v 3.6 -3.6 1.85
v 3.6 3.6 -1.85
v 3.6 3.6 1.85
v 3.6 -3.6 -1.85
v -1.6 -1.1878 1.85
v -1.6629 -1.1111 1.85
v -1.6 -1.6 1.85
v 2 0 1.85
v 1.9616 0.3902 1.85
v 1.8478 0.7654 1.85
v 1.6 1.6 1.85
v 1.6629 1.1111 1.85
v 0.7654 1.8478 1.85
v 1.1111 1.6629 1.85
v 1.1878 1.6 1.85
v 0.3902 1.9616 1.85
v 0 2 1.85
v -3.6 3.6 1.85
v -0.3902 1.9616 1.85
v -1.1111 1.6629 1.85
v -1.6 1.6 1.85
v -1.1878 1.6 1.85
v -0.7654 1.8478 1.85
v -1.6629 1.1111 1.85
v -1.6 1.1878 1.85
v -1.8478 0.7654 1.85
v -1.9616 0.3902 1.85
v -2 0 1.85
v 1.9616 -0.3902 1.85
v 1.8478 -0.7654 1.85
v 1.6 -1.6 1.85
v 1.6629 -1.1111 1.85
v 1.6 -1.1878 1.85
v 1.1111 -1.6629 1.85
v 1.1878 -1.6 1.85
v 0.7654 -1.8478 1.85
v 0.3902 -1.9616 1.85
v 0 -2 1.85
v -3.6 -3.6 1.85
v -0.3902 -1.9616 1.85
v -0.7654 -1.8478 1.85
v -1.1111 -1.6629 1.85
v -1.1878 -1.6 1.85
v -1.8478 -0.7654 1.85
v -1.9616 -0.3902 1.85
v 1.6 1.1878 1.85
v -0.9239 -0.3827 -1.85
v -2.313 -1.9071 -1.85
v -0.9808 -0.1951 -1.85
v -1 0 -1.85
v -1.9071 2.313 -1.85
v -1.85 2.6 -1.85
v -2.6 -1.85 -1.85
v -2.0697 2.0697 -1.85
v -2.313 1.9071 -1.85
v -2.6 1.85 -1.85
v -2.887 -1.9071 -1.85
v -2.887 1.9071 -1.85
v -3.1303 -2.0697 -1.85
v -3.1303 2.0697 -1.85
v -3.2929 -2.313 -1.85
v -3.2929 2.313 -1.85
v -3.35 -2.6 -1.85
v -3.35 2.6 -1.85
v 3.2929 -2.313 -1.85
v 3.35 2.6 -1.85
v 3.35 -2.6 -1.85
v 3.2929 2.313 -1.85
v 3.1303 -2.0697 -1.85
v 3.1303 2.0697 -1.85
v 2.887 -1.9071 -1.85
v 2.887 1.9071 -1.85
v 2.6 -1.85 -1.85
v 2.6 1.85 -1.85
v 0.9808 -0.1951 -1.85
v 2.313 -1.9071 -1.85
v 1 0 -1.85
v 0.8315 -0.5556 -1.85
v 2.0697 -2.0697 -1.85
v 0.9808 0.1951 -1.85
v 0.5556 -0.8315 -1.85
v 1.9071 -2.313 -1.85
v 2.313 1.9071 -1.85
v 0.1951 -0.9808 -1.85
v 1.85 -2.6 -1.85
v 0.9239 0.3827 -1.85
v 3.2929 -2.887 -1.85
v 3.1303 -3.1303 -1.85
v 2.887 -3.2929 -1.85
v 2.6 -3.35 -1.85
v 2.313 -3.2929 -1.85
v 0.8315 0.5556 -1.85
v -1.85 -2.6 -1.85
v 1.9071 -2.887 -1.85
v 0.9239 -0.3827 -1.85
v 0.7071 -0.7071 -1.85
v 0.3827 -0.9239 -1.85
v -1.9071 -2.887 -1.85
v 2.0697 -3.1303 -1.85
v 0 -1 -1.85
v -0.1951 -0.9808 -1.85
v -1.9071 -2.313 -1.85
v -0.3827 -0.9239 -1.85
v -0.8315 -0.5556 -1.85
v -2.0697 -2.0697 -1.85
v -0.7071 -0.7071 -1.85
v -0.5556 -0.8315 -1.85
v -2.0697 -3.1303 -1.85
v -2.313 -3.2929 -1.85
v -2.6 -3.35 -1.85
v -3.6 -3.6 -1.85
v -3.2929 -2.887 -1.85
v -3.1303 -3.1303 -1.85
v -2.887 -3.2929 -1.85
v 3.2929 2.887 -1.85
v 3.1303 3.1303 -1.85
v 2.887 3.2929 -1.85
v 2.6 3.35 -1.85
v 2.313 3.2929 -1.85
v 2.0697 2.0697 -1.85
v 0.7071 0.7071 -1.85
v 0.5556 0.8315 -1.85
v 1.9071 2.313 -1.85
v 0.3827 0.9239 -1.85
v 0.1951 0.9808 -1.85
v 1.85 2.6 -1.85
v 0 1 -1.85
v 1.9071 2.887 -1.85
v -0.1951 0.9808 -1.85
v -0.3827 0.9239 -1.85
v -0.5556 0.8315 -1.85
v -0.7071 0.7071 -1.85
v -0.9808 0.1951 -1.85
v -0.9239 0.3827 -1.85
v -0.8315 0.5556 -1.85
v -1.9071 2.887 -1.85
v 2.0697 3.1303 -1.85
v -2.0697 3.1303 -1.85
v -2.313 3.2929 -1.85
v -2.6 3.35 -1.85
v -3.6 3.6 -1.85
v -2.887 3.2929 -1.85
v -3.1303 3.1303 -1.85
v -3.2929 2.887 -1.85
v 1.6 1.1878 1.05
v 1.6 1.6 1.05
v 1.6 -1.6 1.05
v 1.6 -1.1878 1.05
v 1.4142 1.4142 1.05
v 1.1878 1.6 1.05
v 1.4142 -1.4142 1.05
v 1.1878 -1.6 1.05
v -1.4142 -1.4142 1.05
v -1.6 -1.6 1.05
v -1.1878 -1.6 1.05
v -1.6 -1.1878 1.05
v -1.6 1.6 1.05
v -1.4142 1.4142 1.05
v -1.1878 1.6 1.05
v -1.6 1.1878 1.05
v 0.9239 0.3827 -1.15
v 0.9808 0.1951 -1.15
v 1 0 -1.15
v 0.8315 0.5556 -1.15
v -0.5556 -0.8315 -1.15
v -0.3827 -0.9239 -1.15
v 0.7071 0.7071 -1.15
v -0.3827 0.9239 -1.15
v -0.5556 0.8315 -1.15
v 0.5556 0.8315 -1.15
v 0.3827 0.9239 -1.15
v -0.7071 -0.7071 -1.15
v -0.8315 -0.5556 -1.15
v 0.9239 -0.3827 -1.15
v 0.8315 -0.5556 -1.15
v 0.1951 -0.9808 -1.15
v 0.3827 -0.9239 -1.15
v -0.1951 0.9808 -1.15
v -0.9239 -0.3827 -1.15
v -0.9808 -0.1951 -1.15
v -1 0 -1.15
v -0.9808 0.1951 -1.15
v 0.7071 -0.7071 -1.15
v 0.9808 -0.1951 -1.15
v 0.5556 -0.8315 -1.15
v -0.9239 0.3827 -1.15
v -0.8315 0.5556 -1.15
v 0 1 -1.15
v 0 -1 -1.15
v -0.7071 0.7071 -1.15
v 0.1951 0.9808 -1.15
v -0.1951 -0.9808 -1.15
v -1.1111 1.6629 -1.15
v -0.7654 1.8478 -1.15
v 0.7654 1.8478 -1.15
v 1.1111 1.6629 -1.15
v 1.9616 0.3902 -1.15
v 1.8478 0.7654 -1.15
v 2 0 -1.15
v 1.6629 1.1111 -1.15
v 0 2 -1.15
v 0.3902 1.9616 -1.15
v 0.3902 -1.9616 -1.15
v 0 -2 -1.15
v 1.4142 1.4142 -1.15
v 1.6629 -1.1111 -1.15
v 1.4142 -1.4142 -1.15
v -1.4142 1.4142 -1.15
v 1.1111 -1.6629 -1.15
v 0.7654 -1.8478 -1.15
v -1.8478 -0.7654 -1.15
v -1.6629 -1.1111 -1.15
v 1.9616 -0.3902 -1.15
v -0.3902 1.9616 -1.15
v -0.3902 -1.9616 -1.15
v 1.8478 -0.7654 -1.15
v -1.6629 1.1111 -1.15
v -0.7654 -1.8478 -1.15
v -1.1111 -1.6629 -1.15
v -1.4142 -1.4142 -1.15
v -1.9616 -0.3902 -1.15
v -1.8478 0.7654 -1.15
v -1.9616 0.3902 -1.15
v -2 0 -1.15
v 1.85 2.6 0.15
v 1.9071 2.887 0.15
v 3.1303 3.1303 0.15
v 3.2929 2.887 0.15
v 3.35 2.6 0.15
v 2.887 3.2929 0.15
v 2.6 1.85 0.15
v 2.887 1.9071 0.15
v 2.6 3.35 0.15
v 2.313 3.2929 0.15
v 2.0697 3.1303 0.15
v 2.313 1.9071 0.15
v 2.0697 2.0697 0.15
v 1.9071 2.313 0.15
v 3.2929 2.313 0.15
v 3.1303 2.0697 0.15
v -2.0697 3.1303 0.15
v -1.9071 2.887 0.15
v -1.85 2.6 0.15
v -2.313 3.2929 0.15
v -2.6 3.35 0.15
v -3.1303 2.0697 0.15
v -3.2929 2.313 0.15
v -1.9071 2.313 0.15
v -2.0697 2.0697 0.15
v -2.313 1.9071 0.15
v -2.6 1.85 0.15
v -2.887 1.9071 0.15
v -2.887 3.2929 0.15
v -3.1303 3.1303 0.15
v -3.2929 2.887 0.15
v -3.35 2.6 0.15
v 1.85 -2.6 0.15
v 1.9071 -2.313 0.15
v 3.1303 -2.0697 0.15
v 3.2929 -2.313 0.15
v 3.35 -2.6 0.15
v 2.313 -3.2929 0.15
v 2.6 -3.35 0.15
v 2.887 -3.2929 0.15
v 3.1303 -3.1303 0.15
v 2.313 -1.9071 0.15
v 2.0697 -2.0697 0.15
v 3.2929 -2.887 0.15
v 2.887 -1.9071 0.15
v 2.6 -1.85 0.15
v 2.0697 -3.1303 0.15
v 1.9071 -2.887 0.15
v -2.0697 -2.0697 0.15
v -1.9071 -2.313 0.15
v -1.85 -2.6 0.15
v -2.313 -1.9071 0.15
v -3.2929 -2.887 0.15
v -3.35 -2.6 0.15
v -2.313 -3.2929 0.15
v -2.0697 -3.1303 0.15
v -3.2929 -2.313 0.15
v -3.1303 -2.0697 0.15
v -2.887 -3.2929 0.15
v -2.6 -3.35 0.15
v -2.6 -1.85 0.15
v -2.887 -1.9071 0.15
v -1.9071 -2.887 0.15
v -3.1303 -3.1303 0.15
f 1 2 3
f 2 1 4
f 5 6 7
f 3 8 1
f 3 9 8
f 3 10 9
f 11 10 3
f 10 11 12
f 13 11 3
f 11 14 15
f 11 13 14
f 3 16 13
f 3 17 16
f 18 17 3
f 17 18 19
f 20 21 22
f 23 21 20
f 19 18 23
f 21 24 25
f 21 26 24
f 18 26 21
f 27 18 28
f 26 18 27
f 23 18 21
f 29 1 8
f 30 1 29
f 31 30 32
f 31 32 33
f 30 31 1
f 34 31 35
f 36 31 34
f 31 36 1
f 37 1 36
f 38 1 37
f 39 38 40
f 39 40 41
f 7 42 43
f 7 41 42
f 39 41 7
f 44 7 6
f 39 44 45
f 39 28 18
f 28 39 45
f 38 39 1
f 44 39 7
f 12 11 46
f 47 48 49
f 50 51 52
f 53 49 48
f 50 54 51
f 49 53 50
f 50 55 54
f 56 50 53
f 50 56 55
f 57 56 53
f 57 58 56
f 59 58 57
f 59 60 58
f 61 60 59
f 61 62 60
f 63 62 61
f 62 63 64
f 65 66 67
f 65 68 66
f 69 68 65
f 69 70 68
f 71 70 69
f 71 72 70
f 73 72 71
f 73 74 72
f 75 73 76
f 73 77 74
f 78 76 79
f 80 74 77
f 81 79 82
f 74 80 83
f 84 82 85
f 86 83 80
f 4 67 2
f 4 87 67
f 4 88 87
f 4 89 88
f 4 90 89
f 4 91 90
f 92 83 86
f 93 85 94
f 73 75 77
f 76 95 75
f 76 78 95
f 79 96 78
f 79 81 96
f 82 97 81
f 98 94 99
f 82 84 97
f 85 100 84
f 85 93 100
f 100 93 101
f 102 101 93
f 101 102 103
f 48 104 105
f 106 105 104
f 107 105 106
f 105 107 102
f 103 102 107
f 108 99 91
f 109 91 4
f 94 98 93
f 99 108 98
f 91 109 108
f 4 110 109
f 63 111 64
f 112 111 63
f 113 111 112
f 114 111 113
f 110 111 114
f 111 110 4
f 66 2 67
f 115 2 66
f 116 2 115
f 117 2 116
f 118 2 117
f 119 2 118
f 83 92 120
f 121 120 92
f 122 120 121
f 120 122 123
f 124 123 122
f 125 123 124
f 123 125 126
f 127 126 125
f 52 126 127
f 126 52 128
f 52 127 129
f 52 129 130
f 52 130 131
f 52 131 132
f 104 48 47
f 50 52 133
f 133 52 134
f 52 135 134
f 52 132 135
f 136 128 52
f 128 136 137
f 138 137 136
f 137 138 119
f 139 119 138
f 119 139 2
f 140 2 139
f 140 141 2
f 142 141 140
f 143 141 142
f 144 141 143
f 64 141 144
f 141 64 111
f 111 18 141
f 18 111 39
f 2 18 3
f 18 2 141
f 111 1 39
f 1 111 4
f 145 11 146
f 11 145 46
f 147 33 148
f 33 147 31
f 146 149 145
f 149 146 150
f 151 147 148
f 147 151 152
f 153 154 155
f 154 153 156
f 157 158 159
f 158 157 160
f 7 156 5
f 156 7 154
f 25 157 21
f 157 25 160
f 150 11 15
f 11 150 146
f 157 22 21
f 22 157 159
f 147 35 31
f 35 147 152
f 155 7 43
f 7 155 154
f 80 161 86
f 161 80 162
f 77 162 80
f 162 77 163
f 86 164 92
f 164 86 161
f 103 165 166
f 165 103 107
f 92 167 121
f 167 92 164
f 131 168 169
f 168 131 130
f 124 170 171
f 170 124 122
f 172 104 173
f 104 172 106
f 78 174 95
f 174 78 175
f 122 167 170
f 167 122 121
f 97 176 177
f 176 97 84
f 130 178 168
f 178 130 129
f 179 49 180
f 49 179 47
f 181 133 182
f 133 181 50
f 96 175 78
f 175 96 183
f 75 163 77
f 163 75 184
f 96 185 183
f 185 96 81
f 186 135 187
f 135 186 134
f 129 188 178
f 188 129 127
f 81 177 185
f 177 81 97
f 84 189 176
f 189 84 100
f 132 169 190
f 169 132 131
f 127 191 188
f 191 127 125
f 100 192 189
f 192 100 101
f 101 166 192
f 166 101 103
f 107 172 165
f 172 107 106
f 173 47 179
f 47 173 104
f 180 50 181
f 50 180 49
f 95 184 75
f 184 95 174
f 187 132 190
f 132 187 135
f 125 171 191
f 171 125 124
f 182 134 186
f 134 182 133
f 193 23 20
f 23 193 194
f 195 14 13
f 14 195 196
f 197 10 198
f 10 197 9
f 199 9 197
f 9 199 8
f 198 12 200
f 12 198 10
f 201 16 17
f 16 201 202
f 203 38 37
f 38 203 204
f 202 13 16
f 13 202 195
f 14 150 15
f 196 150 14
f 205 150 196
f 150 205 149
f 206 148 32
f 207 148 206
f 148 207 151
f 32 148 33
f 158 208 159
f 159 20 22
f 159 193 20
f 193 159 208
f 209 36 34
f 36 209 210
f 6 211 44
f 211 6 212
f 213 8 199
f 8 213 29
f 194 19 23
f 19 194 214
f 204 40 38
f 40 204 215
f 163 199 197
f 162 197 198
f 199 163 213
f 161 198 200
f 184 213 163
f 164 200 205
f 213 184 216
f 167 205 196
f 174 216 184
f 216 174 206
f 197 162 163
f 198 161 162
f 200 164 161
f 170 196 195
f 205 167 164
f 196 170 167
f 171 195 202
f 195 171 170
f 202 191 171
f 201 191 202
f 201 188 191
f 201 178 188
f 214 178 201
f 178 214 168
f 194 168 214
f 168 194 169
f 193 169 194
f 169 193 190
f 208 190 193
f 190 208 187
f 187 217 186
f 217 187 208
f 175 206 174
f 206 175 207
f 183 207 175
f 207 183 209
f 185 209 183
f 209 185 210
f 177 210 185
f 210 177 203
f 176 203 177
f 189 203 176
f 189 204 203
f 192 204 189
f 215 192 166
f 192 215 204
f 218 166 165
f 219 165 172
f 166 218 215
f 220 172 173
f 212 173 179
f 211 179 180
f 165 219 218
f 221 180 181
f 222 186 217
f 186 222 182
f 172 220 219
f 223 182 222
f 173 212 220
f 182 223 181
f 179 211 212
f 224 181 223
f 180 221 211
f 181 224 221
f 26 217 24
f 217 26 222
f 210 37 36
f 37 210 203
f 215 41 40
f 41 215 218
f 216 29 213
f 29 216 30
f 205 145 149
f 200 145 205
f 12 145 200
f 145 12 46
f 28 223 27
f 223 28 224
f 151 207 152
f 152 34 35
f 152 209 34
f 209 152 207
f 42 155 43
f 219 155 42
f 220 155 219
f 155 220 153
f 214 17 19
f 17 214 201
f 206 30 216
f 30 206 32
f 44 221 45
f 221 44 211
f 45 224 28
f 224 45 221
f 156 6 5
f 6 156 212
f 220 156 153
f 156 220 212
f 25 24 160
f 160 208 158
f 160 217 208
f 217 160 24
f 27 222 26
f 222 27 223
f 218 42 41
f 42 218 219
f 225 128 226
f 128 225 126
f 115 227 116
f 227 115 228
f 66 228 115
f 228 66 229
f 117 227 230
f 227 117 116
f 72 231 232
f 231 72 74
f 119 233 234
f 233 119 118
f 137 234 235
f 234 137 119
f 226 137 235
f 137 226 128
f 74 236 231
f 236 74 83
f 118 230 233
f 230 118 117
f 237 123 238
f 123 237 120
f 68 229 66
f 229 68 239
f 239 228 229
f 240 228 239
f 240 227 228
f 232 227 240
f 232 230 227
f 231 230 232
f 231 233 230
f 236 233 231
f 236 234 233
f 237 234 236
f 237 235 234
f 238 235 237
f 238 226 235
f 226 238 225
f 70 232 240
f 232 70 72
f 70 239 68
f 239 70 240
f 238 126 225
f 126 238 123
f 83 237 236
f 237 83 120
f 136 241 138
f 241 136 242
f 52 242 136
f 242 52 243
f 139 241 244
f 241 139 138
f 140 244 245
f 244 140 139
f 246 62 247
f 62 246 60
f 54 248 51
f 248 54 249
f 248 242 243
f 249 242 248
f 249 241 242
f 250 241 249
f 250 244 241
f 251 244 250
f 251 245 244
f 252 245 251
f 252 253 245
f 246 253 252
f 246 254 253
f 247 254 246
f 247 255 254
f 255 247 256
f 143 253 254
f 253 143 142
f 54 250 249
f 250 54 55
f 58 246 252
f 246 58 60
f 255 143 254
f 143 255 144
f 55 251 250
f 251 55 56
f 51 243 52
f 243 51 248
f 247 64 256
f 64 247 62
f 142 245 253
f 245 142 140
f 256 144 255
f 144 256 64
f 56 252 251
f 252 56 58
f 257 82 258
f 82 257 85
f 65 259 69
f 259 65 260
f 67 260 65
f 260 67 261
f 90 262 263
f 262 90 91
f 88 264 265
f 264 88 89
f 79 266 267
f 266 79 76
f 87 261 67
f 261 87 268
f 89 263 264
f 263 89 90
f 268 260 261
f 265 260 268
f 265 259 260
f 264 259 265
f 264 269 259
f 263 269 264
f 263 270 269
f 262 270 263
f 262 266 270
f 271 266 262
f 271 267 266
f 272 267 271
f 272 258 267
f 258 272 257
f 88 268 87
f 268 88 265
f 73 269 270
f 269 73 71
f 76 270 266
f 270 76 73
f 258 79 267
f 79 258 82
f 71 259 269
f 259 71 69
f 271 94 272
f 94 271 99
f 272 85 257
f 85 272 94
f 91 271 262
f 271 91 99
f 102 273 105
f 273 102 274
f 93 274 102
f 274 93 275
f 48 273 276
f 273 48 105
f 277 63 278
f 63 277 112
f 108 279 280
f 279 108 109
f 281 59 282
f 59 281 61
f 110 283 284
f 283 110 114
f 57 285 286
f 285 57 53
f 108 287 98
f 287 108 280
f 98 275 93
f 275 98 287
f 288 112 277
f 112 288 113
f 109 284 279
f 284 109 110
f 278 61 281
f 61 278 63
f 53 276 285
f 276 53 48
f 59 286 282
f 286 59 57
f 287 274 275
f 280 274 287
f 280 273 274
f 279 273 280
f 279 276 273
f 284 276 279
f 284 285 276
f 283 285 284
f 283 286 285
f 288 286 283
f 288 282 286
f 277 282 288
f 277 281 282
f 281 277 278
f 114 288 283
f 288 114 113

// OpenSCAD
// Diamond Holder for NV Center Sensor
// Designed for 3x3x0.5mm diamond
// Print in PLA or PETG

// Parameters
diamond_x = 3.2;  // Slightly larger for tolerance
diamond_y = 3.2;
diamond_z = 0.7;
holder_wall = 2;
holder_base = 3;

// Total dimensions
holder_x = diamond_x + 2*holder_wall;
holder_y = diamond_y + 2*holder_wall;
holder_z = diamond_z + holder_base;

// Lens mount parameters
lens_diameter = 25;  // Standard Thorlabs lens tube
lens_height = 10;

module diamond_holder() {
    difference() {
        // Main body
        cube([holder_x, holder_y, holder_z], center=true);
        
        // Diamond cavity
        translate([0, 0, holder_base/2])
            cube([diamond_x, diamond_y, diamond_z + 0.2], center=true);
        
        // Light path (bottom - laser input)
        translate([0, 0, -holder_z/2 - 0.1])
            cylinder(d=2, h=holder_base + 1, $fn=32);
        
        // Light path (top - fluorescence output)
        translate([0, 0, holder_z/2 - holder_base])
            cylinder(d=4, h=holder_base + 1, $fn=32);
        
        // Mounting holes
        translate([holder_x/2 - 1, holder_y/2 - 1, -holder_z/2])
            cylinder(d=1.5, h=2, $fn=16);
        translate([-holder_x/2 + 1, holder_y/2 - 1, -holder_z/2])
            cylinder(d=1.5, h=2, $fn=16);
        translate([holder_x/2 - 1, -holder_y/2 + 1, -holder_z/2])
            cylinder(d=1.5, h=2, $fn=16);
        translate([-holder_x/2 + 1, -holder_y/2 + 1, -holder_z/2])
            cylinder(d=1.5, h=2, $fn=16);
    }
}

module lens_mount() {
    difference() {
        // Outer cylinder
        cylinder(d=lens_diameter + 4, h=lens_height, $fn=64);
        
        // Inner hole for lens tube
        translate([0, 0, -0.1])
            cylinder(d=lens_diameter + 0.5, h=lens_height + 0.2, $fn=64);
        
        // Thread (simplified - use tap or thread insert)
        for(i=[0:3]) {
            rotate([0, 0, i*90])
                translate([lens_diameter/2 + 1.5, 0, lens_height/2])
                    rotate([0, 90, 0])
                        cylinder(d=2.5, h=2, $fn=16);
        }
    }
}

module mw_coil_holder() {
    // Holder for microwave coil around diamond
    coil_d = 12;
    coil_h = 8;
    wire_d = 0.5;
    
    difference() {
        cylinder(d=coil_d + 4, h=coil_h, $fn=32);
        translate([0, 0, -0.1])
            cylinder(d=coil_d, h=coil_h + 0.2, $fn=32);
        
        // Wire channels
        for(i=[0:4]) {
            rotate([0, 0, i*72])
                translate([coil_d/2 + 1, 0, 0])
                    cylinder(d=wire_d + 0.2, h=coil_h + 0.2, $fn=16);
        }
    }
}

// Assembly
module full_assembly() {
    translate([0, 0, holder_z/2])
        diamond_holder();
    
    translate([0, 0, holder_z + lens_height/2])
        lens_mount();
    
    translate([0, 0, -coil_h/2 - 2])
        mw_coil_holder();
}

// Export individual parts for printing
// Print this:
diamond_holder();

// Print this:
// lens_mount();

// Print this:
// mw_coil_holder();

// View full assembly:
// full_assembly();
